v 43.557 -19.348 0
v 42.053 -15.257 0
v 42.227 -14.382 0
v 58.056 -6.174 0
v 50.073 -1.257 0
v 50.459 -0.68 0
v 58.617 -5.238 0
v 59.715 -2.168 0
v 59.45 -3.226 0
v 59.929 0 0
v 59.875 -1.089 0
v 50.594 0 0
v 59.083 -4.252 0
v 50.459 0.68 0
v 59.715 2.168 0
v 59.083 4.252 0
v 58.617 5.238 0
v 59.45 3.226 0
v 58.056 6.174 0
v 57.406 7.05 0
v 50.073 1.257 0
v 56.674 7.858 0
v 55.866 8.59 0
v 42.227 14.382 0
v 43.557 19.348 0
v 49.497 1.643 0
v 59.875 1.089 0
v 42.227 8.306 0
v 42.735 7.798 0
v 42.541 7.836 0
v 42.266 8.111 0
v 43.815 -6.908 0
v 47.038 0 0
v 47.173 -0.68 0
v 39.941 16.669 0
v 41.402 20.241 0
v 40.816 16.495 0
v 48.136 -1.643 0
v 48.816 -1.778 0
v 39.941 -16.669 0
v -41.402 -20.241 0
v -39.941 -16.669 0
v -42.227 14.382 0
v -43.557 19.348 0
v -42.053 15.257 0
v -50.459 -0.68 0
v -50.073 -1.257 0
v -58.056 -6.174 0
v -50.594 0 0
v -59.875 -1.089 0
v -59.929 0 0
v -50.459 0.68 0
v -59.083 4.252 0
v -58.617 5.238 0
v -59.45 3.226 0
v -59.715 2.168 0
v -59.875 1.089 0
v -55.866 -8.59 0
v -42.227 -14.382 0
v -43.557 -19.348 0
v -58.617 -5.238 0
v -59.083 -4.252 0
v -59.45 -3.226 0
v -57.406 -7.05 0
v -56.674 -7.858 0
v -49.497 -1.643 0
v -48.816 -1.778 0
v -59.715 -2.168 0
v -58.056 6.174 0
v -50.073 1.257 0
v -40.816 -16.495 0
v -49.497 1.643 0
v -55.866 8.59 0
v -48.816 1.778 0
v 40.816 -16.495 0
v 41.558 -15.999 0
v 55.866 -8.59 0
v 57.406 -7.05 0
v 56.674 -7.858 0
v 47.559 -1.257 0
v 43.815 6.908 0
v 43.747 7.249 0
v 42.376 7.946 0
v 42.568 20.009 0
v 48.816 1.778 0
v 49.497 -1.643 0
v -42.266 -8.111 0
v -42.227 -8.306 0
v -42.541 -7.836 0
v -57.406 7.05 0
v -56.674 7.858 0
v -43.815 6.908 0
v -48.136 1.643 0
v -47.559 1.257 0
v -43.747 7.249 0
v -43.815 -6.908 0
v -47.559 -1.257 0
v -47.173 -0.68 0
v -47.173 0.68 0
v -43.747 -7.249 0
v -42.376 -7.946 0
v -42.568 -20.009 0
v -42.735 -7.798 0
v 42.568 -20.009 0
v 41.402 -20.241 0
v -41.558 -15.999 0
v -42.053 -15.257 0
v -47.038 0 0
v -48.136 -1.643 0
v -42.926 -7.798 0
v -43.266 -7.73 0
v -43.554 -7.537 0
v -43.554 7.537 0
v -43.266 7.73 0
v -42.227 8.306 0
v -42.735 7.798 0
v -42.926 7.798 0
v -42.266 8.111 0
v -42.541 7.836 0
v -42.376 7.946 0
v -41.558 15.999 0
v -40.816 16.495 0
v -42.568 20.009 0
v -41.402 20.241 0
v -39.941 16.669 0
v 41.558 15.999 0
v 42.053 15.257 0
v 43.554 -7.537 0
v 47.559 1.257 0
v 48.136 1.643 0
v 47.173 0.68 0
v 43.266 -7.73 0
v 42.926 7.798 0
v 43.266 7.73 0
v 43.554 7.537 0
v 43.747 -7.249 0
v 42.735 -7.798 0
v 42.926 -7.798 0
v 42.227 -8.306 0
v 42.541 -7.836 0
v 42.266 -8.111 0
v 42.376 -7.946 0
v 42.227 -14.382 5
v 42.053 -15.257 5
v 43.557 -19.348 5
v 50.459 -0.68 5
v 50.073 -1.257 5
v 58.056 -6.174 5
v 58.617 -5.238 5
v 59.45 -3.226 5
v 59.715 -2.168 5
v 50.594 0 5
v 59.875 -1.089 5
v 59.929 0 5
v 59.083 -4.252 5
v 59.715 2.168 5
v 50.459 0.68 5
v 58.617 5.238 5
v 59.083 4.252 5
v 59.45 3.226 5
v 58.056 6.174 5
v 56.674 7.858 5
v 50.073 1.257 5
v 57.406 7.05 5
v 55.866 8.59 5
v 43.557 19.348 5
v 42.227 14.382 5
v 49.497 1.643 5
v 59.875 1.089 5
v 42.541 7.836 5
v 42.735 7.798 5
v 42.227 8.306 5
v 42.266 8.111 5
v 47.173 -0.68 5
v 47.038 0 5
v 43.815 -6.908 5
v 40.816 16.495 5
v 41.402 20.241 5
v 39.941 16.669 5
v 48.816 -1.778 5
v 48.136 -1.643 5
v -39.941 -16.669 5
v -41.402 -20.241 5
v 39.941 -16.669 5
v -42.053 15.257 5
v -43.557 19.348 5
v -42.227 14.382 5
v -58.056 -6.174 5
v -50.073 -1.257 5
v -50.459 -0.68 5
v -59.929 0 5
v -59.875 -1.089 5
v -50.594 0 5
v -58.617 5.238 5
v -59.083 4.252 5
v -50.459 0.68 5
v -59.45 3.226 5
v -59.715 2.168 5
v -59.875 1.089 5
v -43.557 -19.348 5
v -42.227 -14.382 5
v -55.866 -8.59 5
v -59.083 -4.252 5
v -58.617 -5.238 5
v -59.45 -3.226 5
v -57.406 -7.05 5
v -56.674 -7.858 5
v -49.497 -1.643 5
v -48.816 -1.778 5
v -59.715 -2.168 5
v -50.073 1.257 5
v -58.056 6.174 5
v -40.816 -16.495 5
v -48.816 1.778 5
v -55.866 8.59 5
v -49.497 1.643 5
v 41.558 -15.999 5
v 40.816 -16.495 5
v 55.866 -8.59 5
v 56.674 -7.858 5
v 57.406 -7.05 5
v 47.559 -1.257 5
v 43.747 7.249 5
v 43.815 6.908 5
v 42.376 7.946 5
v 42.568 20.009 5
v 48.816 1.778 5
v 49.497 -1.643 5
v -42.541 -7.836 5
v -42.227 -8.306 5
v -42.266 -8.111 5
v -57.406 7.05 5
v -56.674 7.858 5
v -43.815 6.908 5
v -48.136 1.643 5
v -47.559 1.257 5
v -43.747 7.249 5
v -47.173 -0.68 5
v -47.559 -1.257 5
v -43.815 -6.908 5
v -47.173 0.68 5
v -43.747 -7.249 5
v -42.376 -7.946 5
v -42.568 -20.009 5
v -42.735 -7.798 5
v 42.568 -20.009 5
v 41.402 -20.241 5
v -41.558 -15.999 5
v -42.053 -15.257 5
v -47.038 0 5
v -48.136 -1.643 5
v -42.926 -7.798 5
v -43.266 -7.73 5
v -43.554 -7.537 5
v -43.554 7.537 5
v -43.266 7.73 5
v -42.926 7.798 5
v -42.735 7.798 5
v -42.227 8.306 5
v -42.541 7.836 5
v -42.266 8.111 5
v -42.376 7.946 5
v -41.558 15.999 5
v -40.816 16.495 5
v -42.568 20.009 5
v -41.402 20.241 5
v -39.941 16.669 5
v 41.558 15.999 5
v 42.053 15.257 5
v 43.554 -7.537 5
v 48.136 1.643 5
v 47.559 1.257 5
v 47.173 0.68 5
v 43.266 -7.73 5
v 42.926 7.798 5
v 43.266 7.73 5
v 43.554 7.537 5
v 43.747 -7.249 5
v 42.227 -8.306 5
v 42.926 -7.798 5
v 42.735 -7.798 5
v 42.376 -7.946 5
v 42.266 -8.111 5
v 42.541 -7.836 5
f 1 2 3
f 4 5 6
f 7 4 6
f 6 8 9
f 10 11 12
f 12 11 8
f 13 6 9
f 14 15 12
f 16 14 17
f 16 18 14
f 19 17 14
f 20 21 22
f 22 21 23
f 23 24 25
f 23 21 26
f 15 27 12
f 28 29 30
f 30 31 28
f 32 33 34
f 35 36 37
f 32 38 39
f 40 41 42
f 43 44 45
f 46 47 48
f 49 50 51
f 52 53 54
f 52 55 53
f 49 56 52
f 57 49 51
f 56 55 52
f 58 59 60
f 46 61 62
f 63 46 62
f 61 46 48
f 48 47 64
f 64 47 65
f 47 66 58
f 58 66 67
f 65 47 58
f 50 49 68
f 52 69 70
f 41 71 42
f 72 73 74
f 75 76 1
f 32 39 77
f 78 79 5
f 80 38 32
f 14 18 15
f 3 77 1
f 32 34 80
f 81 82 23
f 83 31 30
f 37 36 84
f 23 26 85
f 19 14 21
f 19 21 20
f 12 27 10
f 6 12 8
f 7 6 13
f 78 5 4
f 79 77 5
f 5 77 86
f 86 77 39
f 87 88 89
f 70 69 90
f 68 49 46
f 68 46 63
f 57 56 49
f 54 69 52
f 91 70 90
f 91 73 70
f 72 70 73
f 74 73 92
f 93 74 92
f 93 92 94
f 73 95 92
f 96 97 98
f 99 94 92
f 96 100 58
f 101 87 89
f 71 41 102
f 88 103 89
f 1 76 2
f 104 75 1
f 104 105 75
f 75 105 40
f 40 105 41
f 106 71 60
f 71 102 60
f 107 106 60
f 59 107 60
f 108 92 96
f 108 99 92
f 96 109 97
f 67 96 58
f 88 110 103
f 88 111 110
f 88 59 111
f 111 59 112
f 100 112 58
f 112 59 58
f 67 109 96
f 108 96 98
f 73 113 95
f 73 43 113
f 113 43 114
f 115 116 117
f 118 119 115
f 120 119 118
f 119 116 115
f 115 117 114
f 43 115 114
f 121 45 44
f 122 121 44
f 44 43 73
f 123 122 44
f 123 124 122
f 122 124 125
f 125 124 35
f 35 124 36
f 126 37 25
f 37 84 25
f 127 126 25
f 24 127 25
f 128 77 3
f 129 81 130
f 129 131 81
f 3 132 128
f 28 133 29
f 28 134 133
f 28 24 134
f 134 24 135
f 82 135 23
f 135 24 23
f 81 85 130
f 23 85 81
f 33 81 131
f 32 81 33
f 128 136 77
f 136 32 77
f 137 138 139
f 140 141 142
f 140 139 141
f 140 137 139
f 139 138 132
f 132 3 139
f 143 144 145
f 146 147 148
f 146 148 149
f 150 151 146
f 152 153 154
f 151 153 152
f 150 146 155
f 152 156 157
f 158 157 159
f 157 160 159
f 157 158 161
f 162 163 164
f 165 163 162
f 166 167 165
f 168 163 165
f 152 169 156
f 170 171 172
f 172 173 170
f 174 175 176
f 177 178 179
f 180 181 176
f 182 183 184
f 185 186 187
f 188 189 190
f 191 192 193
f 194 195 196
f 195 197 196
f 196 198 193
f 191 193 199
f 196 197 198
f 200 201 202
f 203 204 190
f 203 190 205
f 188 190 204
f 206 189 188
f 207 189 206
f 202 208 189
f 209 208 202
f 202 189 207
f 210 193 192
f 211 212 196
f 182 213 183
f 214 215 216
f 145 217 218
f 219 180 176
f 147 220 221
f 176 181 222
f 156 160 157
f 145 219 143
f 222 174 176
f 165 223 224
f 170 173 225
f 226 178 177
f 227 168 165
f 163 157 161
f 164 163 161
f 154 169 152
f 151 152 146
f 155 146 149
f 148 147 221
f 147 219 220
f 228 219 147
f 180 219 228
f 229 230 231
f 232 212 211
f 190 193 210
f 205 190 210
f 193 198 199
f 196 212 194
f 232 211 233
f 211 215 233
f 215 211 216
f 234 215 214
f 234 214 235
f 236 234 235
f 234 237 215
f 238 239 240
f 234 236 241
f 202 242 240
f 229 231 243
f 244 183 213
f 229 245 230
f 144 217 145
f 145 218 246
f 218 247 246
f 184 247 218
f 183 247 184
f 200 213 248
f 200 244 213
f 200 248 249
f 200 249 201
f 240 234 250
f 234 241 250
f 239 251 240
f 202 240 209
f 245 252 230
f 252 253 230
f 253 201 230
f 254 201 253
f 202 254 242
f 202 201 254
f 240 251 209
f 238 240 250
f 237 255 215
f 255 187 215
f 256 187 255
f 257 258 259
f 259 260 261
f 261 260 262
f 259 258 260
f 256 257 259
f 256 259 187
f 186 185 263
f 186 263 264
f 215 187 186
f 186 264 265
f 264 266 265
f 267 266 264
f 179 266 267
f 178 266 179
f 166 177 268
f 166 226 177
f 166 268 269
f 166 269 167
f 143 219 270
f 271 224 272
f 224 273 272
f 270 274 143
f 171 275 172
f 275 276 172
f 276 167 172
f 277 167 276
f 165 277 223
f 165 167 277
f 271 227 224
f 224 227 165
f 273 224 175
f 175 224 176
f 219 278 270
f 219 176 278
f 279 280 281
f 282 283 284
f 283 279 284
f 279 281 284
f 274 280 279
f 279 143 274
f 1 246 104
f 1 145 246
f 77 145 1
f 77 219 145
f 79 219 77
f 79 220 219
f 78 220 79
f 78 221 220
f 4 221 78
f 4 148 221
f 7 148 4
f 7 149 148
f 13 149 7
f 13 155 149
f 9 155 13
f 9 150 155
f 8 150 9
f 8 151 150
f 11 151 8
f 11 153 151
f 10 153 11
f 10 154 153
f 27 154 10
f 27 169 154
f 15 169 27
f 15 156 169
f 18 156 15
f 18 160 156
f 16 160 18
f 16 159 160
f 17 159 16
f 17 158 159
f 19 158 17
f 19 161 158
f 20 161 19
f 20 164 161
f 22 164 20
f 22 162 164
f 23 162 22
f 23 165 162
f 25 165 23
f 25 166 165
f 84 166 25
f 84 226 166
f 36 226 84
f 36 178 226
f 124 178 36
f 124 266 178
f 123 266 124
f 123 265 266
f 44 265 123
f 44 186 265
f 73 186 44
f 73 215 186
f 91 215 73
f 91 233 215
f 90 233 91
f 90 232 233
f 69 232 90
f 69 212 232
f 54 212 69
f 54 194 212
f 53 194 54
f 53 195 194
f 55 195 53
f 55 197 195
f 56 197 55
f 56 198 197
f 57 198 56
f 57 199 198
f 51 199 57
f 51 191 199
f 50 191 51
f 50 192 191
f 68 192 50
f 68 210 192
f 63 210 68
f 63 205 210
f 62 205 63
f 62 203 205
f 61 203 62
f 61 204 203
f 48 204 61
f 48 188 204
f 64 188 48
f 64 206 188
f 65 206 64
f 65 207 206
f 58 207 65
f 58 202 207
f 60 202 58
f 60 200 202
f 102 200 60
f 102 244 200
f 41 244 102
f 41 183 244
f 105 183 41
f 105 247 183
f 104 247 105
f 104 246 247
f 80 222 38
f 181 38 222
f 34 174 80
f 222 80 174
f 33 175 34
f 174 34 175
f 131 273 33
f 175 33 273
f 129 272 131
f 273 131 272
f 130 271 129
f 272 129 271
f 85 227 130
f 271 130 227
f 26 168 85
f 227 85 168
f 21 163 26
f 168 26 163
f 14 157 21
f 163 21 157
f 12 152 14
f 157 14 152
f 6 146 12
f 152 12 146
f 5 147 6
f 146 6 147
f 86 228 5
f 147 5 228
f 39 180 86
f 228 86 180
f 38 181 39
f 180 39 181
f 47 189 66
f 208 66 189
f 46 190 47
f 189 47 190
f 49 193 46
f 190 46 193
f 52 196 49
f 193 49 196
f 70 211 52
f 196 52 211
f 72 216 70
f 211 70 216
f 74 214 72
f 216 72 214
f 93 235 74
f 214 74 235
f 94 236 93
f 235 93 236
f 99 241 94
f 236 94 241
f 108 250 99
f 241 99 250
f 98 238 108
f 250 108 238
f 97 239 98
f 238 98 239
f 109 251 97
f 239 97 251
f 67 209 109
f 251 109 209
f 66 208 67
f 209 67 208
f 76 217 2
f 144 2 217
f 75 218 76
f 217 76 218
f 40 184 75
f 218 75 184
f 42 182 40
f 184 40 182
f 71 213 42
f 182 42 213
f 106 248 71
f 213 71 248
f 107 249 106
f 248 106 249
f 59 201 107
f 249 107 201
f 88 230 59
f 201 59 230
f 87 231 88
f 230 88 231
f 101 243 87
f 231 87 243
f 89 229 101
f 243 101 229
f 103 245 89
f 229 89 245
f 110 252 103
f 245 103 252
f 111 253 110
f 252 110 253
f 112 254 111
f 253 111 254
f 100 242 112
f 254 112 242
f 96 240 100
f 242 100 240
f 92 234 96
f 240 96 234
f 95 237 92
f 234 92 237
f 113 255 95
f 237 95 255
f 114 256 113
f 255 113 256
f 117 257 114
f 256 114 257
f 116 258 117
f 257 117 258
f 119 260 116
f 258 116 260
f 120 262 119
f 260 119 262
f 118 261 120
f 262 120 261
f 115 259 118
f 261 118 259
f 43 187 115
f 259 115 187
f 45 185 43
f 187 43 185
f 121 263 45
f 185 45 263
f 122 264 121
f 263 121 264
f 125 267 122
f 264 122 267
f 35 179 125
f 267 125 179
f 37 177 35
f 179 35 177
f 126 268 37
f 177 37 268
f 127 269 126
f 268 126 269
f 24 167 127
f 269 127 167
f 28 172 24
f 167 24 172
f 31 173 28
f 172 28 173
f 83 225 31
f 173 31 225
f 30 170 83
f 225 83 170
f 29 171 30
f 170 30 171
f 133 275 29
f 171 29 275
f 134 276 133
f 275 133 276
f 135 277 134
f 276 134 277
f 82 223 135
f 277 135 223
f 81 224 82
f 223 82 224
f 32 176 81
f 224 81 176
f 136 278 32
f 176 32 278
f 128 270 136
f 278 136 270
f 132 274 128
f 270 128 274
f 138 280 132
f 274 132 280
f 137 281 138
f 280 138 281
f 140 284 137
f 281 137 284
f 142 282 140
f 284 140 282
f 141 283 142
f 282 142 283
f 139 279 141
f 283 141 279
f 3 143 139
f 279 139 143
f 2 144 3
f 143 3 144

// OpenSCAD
/* = guitar pickup spacer
 * part: spacer (whole part) v1.0.0
 * units: mm, inches
 *
 * * * * *
 *
 * Modelled by Daniel Oaks <https://danieloaks.net>.
 *
 * To the extent possible under law, the person who associated CC0 with
 * this file has waived all copyright and related or neighboring rights
 * to this file.
 * You should have received a copy of the CC0 legalcode along with this
 * work.  If not, see <http://creativecommons.org/publicdomain/zero/1.0/>.
 *
 * * * * *
 *
 * This brings your guitar pickups closer to the strings :)
 *
 * * * * */

// thickness of the spacer
// mm
height = 5;

// how much the bounds overlap, to prevent 'ghosting'.
// inches
overlap = .001;

// radius of the corner between both boxes that make up the internal shape
// inches
inner_champfer_radius = 0.02;

// How detailed should curves be?
Detail_level = 2;


module copy_mirror(vec=[0,0,0], offset=[0,0,0])
{
    children();
    translate(offset) mirror(vec) children();
}

 
module box(width, length, r, rounded=true, centred=true) {
    translate([centred ? 0 : width/2, centred ? 0 : length/2]) copy_mirror([-1,0,0]) copy_mirror([0,-1,0]) {
        if (rounded) {
            translate([-overlap,-overlap]) square([overlap + width/2 - r, overlap + length/2]);
            translate([-overlap,-overlap]) square([overlap + width/2, overlap + length/2 - r]);
            translate([width/2 - r, length/2-r]) circle(r, $fn=8*Detail_level);
        } else {
            translate([-1,-1]) square([width/2+1, length/2+1]);
        }
    }
}

linear_extrude(height) {
    // convert everything from inches back to mm
    scale(25.4) difference() {
        // external shape
        hull() {
            copy_mirror([-1,0,0]) translate([1.9219,0,0]) circle(0.4375, $fn=32*Detail_level);
            box(3.5, 1.5938, .12);
        }

        // internal shape
        {
            box(3.325, 1.3125, .09);
            box(3.45, .614, .035);
        }
        
        // drill holes
        copy_mirror([-1,0,0]) translate([1.9219,0]) circle(d=0.14, $fn=8*Detail_level);
        
        // final smooth edge
        copy_mirror([-1,0,0]) copy_mirror([0,-1,0]) difference() {
            translate([1.6625, 0.307]) square(inner_champfer_radius);
            translate([1.6625 + inner_champfer_radius, 0.307 + inner_champfer_radius]) circle(inner_champfer_radius, $fn=8*Detail_level);
        }
    }
}
